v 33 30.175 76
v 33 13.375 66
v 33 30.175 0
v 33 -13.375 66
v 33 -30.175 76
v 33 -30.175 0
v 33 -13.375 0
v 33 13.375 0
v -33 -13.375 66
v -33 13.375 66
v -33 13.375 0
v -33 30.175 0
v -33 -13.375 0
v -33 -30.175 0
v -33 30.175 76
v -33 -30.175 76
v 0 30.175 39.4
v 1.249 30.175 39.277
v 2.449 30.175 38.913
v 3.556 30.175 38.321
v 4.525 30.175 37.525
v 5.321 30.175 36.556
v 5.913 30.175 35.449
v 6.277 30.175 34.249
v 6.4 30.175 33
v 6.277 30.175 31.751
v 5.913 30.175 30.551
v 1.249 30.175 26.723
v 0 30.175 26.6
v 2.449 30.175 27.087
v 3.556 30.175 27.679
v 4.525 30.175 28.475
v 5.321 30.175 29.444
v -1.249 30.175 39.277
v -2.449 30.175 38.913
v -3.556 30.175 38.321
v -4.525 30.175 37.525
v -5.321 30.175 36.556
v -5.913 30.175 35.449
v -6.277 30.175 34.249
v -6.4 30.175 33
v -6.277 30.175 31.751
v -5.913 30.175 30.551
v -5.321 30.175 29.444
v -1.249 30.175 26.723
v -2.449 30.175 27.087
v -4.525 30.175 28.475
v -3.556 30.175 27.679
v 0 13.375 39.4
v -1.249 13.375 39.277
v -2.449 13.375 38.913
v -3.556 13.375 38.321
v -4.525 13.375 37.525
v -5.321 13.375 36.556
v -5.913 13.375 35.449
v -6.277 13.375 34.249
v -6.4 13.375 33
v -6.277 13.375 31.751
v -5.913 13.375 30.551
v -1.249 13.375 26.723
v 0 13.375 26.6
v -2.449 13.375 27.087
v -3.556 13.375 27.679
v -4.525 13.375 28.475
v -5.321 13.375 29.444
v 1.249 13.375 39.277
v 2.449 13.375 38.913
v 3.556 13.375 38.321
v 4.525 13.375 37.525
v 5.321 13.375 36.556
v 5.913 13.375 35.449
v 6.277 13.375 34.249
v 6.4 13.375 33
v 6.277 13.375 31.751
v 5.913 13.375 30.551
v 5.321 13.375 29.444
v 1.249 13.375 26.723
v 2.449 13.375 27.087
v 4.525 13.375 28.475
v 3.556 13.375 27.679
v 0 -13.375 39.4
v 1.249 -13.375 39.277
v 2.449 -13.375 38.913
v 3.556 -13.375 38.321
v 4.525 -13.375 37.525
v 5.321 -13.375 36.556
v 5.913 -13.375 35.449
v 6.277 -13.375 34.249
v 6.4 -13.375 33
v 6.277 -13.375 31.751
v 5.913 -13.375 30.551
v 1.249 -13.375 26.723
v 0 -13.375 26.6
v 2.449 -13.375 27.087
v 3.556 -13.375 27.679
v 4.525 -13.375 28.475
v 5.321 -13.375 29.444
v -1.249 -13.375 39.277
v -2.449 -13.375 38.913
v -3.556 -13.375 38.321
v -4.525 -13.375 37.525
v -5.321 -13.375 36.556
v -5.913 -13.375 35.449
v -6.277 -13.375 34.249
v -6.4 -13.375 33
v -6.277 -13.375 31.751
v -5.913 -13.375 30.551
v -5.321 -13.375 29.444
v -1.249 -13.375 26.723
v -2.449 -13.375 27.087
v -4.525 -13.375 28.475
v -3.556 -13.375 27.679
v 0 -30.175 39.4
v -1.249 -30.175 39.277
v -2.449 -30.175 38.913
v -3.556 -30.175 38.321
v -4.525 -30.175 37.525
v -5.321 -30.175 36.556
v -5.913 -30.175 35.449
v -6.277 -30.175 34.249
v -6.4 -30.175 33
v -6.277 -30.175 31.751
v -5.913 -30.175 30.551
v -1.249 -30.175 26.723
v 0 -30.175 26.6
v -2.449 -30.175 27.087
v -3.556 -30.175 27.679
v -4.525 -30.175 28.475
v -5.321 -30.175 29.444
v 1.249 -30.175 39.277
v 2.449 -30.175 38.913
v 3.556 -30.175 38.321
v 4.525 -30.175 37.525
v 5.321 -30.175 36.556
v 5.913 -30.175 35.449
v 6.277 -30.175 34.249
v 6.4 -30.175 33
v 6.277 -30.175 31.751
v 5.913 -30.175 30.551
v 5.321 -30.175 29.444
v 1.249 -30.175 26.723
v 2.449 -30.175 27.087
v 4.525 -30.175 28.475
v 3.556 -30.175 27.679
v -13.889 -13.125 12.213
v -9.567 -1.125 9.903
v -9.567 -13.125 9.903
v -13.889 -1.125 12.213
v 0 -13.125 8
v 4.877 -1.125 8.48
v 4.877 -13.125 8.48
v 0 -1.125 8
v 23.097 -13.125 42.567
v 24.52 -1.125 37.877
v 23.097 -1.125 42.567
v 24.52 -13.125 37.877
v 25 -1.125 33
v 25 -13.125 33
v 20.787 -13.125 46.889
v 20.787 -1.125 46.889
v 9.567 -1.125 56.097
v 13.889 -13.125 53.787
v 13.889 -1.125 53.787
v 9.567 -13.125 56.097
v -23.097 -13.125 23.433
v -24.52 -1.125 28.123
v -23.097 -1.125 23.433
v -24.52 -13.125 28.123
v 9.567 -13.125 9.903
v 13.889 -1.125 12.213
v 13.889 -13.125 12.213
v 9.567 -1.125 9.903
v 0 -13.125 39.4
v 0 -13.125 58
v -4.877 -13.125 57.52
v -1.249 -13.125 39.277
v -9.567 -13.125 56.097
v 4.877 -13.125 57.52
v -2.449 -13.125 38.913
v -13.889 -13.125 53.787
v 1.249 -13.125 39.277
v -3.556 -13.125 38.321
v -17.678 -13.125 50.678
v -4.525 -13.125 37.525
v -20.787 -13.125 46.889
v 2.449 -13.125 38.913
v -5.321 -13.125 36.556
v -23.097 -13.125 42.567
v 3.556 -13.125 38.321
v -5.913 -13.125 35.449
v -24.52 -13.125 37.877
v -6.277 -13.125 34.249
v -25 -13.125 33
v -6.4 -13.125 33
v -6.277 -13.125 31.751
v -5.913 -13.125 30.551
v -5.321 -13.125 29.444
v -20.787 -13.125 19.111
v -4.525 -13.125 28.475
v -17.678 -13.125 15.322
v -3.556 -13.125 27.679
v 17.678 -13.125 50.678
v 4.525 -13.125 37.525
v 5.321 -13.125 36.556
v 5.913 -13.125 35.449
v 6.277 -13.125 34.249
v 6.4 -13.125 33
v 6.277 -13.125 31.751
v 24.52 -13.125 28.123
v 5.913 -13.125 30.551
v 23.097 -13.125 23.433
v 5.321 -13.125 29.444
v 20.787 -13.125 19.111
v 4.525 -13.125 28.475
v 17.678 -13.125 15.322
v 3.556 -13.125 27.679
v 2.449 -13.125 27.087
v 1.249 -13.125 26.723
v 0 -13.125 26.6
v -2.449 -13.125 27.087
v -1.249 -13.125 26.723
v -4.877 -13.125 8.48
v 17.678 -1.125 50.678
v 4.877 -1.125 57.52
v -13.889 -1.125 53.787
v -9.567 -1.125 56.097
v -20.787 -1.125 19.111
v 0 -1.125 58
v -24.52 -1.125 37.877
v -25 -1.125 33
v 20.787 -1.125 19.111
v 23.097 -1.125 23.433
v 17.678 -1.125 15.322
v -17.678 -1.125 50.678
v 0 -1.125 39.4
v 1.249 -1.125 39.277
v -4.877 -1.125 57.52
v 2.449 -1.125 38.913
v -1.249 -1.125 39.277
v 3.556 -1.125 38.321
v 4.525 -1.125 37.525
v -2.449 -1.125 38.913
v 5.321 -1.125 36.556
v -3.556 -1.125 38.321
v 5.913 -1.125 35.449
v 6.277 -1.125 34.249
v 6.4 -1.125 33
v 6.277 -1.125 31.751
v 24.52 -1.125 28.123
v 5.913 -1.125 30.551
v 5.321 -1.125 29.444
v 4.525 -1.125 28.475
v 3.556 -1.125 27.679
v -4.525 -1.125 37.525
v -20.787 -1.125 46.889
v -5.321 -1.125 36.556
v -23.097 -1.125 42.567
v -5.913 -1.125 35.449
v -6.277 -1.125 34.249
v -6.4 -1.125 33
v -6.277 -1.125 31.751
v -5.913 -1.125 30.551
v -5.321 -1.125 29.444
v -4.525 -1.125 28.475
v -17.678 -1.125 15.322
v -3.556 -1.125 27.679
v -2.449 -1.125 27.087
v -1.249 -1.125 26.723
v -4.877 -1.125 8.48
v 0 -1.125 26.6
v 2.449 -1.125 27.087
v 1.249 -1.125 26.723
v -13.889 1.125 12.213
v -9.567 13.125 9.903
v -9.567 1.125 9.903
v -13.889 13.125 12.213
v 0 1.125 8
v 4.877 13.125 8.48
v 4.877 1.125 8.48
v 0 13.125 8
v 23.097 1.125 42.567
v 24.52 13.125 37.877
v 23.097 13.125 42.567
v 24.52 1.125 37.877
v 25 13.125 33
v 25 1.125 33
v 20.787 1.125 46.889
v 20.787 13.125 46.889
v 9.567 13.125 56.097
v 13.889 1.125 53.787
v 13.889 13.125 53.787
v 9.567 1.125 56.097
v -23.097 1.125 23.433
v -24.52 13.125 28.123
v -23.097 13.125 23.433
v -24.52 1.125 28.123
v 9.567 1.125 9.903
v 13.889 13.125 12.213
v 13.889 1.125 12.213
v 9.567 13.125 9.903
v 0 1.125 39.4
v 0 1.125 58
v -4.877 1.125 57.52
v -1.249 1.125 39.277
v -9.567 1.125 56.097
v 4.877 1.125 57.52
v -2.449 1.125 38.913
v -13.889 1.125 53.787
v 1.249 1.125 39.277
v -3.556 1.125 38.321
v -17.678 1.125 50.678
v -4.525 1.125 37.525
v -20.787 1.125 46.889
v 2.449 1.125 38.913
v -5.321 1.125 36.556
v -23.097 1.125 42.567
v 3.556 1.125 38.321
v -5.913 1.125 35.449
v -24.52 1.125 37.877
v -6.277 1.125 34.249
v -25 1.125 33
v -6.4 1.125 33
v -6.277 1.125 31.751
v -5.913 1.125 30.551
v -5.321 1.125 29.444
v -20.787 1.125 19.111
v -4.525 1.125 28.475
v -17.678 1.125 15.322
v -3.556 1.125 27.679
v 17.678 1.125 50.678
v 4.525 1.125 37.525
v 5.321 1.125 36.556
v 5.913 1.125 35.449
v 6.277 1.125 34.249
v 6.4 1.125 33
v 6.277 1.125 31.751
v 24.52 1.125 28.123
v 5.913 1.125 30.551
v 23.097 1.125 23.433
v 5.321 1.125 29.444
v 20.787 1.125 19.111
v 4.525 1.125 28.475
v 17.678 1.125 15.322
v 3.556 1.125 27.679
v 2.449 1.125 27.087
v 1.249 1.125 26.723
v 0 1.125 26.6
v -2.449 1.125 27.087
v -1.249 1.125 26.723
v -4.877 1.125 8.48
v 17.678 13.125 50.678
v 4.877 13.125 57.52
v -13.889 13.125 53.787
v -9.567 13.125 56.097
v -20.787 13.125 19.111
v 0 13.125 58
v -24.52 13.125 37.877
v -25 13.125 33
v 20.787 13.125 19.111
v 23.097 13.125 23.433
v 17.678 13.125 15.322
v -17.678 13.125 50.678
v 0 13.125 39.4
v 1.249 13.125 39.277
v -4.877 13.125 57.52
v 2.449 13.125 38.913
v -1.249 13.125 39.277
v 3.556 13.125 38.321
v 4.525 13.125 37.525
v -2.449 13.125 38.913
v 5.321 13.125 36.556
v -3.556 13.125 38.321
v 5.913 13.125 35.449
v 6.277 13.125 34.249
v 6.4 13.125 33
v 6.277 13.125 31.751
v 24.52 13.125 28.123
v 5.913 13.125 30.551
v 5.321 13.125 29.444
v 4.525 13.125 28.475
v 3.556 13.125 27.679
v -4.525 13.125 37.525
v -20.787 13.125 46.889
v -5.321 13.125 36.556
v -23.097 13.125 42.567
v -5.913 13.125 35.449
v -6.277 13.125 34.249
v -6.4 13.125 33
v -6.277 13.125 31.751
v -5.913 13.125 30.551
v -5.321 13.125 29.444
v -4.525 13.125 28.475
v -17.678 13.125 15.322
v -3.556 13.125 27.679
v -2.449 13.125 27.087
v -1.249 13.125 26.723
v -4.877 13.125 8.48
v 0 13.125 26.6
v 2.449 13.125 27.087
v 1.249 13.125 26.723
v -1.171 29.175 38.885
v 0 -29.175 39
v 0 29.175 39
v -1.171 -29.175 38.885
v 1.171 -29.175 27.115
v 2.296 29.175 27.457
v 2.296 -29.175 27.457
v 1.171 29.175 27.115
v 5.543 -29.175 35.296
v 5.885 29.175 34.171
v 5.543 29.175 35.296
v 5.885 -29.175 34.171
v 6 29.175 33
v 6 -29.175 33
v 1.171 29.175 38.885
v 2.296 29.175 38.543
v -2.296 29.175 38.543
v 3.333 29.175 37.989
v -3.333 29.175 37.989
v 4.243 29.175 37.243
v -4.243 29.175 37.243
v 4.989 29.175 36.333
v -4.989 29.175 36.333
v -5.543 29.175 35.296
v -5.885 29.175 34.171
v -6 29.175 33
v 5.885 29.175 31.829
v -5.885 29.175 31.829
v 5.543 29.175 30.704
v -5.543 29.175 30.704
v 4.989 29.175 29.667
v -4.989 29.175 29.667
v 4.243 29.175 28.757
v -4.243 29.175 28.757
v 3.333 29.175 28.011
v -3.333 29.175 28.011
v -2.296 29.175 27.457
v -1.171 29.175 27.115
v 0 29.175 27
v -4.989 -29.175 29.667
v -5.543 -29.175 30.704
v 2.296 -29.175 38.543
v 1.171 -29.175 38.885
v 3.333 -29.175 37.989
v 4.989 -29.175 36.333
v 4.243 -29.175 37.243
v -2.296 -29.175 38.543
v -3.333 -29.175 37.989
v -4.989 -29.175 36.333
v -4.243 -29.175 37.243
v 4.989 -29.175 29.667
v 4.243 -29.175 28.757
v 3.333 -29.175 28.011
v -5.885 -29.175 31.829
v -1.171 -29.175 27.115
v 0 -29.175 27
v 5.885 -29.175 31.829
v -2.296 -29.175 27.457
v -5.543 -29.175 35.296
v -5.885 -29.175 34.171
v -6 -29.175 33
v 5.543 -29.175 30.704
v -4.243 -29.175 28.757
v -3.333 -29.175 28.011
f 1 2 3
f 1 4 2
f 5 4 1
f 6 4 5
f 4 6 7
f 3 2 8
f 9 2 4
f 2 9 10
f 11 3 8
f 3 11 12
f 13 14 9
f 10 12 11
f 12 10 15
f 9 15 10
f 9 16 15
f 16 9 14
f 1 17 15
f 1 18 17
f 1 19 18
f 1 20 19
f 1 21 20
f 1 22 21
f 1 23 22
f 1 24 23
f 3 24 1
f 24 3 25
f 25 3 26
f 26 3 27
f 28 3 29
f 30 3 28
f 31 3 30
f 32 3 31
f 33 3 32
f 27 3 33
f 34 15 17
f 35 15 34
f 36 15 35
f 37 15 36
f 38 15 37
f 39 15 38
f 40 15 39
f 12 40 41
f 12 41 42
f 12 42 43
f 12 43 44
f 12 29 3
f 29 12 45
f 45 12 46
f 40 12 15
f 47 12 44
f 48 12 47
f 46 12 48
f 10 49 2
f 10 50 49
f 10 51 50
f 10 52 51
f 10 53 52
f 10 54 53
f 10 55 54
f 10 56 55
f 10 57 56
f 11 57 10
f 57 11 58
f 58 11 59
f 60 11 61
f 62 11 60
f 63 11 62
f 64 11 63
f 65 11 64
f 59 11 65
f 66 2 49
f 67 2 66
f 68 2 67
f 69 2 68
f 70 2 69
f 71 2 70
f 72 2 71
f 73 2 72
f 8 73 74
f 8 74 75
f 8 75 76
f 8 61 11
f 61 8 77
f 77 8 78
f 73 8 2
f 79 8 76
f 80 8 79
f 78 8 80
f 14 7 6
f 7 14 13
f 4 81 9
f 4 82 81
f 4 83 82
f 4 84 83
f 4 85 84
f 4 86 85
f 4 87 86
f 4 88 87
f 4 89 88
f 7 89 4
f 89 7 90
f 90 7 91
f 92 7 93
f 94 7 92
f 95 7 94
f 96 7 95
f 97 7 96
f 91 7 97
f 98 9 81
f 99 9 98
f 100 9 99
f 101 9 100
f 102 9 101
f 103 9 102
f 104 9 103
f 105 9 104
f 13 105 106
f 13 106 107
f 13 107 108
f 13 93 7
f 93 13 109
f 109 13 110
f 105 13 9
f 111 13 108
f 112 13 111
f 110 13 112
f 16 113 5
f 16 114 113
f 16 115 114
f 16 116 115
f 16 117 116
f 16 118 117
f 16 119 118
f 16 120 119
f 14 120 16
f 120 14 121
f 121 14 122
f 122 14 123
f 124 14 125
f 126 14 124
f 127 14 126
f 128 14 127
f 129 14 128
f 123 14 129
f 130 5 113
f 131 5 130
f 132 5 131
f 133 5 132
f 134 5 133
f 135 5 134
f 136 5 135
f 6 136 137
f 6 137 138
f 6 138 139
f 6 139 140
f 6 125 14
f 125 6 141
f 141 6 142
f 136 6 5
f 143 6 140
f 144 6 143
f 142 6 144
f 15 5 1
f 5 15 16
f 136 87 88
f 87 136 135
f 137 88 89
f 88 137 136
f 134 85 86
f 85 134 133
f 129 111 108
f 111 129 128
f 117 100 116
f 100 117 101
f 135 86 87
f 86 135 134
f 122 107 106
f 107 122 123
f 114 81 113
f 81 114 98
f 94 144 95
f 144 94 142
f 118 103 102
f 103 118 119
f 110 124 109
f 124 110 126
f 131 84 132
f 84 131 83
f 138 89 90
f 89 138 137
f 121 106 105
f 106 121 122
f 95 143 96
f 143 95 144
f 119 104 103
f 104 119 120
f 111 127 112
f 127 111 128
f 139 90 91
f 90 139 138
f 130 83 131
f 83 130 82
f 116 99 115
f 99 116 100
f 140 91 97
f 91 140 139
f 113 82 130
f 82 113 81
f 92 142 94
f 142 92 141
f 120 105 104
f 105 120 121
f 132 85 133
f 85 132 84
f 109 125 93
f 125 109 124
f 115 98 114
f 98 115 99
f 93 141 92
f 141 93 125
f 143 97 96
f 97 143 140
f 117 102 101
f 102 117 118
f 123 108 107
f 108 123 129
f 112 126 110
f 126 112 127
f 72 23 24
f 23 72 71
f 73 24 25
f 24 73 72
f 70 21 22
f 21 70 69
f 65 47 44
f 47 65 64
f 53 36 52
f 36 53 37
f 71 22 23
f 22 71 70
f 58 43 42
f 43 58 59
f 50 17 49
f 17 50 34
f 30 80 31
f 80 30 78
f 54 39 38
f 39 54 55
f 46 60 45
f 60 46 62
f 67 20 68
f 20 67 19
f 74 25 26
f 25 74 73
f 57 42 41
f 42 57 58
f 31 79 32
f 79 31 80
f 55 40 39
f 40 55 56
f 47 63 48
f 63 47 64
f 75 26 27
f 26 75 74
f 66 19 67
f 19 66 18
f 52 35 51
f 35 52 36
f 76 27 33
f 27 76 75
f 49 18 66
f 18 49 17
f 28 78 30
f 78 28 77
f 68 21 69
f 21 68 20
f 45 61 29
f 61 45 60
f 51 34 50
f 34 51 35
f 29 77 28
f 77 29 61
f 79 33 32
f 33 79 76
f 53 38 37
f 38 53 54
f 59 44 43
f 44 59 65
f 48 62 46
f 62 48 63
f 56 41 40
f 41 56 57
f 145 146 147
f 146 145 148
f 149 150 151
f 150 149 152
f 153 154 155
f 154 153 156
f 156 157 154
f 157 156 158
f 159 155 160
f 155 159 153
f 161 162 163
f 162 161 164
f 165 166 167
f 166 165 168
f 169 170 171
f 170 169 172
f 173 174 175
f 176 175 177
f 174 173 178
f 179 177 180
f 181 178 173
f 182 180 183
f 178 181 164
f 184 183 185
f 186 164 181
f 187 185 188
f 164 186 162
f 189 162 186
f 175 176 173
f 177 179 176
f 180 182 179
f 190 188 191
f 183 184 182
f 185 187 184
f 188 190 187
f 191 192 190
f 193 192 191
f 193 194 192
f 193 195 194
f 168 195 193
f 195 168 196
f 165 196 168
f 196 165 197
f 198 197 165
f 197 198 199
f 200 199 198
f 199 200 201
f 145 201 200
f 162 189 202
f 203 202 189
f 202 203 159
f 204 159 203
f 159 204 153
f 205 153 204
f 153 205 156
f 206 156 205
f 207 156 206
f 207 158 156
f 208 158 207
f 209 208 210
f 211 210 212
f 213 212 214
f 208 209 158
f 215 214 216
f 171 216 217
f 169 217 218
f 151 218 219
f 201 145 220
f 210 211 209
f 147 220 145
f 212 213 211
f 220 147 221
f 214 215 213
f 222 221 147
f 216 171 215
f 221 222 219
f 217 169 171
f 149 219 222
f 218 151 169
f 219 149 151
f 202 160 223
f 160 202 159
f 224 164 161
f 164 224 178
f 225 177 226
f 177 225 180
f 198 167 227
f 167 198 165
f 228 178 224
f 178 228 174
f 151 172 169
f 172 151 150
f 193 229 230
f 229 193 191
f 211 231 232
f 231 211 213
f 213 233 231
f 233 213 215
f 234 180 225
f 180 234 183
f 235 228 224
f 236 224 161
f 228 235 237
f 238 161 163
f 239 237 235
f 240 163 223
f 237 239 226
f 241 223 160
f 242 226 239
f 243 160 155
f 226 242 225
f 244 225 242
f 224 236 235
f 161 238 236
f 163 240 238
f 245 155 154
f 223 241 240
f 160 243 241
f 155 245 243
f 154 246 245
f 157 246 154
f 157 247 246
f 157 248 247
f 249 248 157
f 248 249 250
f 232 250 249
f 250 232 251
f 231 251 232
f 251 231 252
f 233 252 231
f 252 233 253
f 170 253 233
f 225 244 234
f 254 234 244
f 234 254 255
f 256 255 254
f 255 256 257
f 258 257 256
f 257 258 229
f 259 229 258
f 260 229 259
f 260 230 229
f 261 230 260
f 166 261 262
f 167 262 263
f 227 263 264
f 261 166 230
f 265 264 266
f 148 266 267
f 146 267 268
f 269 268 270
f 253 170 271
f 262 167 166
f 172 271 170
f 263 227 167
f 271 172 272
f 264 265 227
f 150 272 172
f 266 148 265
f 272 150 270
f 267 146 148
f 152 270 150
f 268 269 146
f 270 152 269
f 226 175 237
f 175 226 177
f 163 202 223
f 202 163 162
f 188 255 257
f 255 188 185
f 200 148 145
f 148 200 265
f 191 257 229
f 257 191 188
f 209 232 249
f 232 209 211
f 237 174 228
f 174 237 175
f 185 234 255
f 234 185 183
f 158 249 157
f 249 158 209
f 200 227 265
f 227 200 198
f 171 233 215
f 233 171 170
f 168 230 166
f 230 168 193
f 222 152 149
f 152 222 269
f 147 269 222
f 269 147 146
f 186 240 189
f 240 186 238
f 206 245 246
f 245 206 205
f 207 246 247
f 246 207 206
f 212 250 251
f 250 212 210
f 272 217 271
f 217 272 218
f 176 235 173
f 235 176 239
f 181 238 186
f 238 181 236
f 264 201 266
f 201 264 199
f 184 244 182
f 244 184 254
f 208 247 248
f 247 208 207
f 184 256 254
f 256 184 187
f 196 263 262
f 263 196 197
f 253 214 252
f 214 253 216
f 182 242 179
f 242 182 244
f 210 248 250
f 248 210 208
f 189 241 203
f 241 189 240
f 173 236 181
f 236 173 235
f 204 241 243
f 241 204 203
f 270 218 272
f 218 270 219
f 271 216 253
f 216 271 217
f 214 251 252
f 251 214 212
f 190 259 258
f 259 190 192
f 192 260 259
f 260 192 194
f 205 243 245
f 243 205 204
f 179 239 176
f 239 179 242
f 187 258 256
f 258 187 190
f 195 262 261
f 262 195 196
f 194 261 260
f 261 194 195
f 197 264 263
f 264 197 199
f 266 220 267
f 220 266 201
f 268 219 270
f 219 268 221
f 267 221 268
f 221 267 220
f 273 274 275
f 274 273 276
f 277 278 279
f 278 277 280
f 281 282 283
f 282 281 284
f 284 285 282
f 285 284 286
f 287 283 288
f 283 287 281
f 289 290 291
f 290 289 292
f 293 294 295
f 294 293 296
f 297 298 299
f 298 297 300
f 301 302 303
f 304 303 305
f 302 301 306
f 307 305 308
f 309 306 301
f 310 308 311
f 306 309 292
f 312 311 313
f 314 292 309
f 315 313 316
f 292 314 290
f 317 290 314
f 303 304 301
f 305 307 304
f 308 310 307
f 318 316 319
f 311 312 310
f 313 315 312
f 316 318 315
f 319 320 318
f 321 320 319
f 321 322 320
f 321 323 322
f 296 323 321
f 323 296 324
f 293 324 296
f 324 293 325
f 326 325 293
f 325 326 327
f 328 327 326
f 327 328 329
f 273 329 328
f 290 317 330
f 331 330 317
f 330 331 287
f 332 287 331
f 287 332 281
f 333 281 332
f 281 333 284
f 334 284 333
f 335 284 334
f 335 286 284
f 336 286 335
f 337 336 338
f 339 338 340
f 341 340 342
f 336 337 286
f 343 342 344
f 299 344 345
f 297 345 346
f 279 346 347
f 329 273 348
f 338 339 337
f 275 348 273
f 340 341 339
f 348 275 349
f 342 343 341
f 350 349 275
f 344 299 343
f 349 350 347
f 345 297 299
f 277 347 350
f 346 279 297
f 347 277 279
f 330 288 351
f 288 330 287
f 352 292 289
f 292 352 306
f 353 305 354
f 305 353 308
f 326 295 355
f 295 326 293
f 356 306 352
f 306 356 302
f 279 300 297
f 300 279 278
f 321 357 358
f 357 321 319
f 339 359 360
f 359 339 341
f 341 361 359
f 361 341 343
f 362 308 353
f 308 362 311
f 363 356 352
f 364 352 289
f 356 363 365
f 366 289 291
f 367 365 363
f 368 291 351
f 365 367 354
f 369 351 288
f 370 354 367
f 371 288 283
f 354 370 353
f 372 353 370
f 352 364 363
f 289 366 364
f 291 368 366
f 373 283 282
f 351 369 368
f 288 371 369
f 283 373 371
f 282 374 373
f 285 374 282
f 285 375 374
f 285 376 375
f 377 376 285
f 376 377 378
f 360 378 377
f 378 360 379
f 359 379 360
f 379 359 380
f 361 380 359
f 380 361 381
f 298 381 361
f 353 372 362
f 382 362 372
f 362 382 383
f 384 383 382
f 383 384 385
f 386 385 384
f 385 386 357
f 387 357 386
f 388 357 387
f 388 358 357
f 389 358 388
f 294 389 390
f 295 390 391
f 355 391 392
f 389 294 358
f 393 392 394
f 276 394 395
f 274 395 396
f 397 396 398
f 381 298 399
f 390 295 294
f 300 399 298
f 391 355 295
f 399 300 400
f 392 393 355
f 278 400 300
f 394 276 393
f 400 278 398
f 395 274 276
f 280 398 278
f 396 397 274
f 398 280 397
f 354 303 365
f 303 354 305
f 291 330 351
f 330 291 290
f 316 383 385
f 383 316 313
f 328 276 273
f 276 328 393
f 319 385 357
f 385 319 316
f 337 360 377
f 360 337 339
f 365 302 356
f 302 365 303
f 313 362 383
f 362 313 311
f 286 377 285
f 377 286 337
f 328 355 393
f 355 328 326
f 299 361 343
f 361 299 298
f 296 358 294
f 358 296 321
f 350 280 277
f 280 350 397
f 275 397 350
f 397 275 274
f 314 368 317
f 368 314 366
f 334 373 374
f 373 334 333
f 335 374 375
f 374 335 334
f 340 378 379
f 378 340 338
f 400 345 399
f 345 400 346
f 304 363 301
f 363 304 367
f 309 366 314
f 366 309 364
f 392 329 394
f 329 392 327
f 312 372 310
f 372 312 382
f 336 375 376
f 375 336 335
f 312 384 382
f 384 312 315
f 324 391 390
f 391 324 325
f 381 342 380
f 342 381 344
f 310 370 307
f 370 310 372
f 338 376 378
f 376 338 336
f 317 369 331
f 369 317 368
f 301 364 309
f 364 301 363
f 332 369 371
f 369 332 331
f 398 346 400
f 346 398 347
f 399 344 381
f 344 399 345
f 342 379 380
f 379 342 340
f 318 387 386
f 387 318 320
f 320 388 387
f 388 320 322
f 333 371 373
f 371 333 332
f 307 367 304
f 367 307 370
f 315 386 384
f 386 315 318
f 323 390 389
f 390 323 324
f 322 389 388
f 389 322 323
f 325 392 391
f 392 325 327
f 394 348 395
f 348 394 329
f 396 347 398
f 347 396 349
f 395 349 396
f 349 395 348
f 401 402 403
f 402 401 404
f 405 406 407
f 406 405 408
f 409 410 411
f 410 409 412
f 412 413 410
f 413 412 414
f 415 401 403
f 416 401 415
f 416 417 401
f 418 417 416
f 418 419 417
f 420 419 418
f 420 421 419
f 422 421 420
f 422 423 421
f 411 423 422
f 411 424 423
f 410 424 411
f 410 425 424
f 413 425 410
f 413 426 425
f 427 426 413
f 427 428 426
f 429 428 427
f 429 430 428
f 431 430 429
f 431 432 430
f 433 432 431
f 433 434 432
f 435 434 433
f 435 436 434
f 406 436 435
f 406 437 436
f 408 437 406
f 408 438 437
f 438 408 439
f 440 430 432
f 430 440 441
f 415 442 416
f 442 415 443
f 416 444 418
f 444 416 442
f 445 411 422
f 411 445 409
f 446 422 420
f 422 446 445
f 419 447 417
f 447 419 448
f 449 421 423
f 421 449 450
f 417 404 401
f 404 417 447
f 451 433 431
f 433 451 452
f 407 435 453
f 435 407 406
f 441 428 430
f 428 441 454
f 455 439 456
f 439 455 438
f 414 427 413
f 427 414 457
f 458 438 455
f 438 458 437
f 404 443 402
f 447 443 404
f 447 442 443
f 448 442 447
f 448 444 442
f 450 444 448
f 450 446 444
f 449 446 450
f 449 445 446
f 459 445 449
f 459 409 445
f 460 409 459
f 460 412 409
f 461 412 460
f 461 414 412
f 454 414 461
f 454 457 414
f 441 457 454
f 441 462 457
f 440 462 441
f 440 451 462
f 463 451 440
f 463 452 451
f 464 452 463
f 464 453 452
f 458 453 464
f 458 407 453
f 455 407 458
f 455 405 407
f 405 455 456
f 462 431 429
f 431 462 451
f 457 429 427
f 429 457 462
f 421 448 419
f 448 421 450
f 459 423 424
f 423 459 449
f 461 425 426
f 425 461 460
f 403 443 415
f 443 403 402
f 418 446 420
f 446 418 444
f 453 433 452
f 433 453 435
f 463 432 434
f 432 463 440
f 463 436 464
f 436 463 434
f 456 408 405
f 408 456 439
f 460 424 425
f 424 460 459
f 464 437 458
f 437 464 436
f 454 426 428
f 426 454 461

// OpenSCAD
$fn = 32;

// ------------------------------------------------------------------------
// Trolley wheel set: wheels d50, fork 66 mm tall
// Every part is its own module, assembly() places every instance.
// ------------------------------------------------------------------------

// --- part 1 ---
module trolley_fork() {
  difference() {
    union() {
      translate([-33, 13.375, 0]) cube([66, 16.8, 66]);
      translate([-33, -30.175, 0]) cube([66, 16.8, 66]);
      translate([-33, -30.175, 66]) cube([66, 60.35, 10]);
    }
    translate([0, -21.775, 33]) rotate([90, 0, 0]) cylinder(h = 18.8, d = 12.8, center = true);
    translate([0, 21.775, 33]) rotate([90, 0, 0]) cylinder(h = 18.8, d = 12.8, center = true);
  }
}

// --- part 2 ---
module trolley_wheel() {
  difference() {
      translate([0, 0, 0]) cylinder(h = 12, d = 50);
      translate([0, 0, -1]) cylinder(h = 14, d = 12.8);
    }
}

// --- part 3 ---
module trolley_axle() {
  translate([0, 0, -29.175]) cylinder(h = 58.35, d = 12);
}

// --- assembly ---
module assembly() {
  color([0.80, 0.24, 0.20]) translate([0, 0, 0]) rotate([0, 0, 0]) trolley_fork();
  color([0.20, 0.45, 0.75]) translate([0, -1.125, 33]) rotate([90, 0, 0]) trolley_wheel();
  color([0.25, 0.62, 0.32]) translate([0, 13.125, 33]) rotate([90, 0, 0]) trolley_wheel();
  color([0.92, 0.70, 0.18]) translate([0, 0, 33]) rotate([90, 0, 0]) trolley_axle();
}

assembly();
